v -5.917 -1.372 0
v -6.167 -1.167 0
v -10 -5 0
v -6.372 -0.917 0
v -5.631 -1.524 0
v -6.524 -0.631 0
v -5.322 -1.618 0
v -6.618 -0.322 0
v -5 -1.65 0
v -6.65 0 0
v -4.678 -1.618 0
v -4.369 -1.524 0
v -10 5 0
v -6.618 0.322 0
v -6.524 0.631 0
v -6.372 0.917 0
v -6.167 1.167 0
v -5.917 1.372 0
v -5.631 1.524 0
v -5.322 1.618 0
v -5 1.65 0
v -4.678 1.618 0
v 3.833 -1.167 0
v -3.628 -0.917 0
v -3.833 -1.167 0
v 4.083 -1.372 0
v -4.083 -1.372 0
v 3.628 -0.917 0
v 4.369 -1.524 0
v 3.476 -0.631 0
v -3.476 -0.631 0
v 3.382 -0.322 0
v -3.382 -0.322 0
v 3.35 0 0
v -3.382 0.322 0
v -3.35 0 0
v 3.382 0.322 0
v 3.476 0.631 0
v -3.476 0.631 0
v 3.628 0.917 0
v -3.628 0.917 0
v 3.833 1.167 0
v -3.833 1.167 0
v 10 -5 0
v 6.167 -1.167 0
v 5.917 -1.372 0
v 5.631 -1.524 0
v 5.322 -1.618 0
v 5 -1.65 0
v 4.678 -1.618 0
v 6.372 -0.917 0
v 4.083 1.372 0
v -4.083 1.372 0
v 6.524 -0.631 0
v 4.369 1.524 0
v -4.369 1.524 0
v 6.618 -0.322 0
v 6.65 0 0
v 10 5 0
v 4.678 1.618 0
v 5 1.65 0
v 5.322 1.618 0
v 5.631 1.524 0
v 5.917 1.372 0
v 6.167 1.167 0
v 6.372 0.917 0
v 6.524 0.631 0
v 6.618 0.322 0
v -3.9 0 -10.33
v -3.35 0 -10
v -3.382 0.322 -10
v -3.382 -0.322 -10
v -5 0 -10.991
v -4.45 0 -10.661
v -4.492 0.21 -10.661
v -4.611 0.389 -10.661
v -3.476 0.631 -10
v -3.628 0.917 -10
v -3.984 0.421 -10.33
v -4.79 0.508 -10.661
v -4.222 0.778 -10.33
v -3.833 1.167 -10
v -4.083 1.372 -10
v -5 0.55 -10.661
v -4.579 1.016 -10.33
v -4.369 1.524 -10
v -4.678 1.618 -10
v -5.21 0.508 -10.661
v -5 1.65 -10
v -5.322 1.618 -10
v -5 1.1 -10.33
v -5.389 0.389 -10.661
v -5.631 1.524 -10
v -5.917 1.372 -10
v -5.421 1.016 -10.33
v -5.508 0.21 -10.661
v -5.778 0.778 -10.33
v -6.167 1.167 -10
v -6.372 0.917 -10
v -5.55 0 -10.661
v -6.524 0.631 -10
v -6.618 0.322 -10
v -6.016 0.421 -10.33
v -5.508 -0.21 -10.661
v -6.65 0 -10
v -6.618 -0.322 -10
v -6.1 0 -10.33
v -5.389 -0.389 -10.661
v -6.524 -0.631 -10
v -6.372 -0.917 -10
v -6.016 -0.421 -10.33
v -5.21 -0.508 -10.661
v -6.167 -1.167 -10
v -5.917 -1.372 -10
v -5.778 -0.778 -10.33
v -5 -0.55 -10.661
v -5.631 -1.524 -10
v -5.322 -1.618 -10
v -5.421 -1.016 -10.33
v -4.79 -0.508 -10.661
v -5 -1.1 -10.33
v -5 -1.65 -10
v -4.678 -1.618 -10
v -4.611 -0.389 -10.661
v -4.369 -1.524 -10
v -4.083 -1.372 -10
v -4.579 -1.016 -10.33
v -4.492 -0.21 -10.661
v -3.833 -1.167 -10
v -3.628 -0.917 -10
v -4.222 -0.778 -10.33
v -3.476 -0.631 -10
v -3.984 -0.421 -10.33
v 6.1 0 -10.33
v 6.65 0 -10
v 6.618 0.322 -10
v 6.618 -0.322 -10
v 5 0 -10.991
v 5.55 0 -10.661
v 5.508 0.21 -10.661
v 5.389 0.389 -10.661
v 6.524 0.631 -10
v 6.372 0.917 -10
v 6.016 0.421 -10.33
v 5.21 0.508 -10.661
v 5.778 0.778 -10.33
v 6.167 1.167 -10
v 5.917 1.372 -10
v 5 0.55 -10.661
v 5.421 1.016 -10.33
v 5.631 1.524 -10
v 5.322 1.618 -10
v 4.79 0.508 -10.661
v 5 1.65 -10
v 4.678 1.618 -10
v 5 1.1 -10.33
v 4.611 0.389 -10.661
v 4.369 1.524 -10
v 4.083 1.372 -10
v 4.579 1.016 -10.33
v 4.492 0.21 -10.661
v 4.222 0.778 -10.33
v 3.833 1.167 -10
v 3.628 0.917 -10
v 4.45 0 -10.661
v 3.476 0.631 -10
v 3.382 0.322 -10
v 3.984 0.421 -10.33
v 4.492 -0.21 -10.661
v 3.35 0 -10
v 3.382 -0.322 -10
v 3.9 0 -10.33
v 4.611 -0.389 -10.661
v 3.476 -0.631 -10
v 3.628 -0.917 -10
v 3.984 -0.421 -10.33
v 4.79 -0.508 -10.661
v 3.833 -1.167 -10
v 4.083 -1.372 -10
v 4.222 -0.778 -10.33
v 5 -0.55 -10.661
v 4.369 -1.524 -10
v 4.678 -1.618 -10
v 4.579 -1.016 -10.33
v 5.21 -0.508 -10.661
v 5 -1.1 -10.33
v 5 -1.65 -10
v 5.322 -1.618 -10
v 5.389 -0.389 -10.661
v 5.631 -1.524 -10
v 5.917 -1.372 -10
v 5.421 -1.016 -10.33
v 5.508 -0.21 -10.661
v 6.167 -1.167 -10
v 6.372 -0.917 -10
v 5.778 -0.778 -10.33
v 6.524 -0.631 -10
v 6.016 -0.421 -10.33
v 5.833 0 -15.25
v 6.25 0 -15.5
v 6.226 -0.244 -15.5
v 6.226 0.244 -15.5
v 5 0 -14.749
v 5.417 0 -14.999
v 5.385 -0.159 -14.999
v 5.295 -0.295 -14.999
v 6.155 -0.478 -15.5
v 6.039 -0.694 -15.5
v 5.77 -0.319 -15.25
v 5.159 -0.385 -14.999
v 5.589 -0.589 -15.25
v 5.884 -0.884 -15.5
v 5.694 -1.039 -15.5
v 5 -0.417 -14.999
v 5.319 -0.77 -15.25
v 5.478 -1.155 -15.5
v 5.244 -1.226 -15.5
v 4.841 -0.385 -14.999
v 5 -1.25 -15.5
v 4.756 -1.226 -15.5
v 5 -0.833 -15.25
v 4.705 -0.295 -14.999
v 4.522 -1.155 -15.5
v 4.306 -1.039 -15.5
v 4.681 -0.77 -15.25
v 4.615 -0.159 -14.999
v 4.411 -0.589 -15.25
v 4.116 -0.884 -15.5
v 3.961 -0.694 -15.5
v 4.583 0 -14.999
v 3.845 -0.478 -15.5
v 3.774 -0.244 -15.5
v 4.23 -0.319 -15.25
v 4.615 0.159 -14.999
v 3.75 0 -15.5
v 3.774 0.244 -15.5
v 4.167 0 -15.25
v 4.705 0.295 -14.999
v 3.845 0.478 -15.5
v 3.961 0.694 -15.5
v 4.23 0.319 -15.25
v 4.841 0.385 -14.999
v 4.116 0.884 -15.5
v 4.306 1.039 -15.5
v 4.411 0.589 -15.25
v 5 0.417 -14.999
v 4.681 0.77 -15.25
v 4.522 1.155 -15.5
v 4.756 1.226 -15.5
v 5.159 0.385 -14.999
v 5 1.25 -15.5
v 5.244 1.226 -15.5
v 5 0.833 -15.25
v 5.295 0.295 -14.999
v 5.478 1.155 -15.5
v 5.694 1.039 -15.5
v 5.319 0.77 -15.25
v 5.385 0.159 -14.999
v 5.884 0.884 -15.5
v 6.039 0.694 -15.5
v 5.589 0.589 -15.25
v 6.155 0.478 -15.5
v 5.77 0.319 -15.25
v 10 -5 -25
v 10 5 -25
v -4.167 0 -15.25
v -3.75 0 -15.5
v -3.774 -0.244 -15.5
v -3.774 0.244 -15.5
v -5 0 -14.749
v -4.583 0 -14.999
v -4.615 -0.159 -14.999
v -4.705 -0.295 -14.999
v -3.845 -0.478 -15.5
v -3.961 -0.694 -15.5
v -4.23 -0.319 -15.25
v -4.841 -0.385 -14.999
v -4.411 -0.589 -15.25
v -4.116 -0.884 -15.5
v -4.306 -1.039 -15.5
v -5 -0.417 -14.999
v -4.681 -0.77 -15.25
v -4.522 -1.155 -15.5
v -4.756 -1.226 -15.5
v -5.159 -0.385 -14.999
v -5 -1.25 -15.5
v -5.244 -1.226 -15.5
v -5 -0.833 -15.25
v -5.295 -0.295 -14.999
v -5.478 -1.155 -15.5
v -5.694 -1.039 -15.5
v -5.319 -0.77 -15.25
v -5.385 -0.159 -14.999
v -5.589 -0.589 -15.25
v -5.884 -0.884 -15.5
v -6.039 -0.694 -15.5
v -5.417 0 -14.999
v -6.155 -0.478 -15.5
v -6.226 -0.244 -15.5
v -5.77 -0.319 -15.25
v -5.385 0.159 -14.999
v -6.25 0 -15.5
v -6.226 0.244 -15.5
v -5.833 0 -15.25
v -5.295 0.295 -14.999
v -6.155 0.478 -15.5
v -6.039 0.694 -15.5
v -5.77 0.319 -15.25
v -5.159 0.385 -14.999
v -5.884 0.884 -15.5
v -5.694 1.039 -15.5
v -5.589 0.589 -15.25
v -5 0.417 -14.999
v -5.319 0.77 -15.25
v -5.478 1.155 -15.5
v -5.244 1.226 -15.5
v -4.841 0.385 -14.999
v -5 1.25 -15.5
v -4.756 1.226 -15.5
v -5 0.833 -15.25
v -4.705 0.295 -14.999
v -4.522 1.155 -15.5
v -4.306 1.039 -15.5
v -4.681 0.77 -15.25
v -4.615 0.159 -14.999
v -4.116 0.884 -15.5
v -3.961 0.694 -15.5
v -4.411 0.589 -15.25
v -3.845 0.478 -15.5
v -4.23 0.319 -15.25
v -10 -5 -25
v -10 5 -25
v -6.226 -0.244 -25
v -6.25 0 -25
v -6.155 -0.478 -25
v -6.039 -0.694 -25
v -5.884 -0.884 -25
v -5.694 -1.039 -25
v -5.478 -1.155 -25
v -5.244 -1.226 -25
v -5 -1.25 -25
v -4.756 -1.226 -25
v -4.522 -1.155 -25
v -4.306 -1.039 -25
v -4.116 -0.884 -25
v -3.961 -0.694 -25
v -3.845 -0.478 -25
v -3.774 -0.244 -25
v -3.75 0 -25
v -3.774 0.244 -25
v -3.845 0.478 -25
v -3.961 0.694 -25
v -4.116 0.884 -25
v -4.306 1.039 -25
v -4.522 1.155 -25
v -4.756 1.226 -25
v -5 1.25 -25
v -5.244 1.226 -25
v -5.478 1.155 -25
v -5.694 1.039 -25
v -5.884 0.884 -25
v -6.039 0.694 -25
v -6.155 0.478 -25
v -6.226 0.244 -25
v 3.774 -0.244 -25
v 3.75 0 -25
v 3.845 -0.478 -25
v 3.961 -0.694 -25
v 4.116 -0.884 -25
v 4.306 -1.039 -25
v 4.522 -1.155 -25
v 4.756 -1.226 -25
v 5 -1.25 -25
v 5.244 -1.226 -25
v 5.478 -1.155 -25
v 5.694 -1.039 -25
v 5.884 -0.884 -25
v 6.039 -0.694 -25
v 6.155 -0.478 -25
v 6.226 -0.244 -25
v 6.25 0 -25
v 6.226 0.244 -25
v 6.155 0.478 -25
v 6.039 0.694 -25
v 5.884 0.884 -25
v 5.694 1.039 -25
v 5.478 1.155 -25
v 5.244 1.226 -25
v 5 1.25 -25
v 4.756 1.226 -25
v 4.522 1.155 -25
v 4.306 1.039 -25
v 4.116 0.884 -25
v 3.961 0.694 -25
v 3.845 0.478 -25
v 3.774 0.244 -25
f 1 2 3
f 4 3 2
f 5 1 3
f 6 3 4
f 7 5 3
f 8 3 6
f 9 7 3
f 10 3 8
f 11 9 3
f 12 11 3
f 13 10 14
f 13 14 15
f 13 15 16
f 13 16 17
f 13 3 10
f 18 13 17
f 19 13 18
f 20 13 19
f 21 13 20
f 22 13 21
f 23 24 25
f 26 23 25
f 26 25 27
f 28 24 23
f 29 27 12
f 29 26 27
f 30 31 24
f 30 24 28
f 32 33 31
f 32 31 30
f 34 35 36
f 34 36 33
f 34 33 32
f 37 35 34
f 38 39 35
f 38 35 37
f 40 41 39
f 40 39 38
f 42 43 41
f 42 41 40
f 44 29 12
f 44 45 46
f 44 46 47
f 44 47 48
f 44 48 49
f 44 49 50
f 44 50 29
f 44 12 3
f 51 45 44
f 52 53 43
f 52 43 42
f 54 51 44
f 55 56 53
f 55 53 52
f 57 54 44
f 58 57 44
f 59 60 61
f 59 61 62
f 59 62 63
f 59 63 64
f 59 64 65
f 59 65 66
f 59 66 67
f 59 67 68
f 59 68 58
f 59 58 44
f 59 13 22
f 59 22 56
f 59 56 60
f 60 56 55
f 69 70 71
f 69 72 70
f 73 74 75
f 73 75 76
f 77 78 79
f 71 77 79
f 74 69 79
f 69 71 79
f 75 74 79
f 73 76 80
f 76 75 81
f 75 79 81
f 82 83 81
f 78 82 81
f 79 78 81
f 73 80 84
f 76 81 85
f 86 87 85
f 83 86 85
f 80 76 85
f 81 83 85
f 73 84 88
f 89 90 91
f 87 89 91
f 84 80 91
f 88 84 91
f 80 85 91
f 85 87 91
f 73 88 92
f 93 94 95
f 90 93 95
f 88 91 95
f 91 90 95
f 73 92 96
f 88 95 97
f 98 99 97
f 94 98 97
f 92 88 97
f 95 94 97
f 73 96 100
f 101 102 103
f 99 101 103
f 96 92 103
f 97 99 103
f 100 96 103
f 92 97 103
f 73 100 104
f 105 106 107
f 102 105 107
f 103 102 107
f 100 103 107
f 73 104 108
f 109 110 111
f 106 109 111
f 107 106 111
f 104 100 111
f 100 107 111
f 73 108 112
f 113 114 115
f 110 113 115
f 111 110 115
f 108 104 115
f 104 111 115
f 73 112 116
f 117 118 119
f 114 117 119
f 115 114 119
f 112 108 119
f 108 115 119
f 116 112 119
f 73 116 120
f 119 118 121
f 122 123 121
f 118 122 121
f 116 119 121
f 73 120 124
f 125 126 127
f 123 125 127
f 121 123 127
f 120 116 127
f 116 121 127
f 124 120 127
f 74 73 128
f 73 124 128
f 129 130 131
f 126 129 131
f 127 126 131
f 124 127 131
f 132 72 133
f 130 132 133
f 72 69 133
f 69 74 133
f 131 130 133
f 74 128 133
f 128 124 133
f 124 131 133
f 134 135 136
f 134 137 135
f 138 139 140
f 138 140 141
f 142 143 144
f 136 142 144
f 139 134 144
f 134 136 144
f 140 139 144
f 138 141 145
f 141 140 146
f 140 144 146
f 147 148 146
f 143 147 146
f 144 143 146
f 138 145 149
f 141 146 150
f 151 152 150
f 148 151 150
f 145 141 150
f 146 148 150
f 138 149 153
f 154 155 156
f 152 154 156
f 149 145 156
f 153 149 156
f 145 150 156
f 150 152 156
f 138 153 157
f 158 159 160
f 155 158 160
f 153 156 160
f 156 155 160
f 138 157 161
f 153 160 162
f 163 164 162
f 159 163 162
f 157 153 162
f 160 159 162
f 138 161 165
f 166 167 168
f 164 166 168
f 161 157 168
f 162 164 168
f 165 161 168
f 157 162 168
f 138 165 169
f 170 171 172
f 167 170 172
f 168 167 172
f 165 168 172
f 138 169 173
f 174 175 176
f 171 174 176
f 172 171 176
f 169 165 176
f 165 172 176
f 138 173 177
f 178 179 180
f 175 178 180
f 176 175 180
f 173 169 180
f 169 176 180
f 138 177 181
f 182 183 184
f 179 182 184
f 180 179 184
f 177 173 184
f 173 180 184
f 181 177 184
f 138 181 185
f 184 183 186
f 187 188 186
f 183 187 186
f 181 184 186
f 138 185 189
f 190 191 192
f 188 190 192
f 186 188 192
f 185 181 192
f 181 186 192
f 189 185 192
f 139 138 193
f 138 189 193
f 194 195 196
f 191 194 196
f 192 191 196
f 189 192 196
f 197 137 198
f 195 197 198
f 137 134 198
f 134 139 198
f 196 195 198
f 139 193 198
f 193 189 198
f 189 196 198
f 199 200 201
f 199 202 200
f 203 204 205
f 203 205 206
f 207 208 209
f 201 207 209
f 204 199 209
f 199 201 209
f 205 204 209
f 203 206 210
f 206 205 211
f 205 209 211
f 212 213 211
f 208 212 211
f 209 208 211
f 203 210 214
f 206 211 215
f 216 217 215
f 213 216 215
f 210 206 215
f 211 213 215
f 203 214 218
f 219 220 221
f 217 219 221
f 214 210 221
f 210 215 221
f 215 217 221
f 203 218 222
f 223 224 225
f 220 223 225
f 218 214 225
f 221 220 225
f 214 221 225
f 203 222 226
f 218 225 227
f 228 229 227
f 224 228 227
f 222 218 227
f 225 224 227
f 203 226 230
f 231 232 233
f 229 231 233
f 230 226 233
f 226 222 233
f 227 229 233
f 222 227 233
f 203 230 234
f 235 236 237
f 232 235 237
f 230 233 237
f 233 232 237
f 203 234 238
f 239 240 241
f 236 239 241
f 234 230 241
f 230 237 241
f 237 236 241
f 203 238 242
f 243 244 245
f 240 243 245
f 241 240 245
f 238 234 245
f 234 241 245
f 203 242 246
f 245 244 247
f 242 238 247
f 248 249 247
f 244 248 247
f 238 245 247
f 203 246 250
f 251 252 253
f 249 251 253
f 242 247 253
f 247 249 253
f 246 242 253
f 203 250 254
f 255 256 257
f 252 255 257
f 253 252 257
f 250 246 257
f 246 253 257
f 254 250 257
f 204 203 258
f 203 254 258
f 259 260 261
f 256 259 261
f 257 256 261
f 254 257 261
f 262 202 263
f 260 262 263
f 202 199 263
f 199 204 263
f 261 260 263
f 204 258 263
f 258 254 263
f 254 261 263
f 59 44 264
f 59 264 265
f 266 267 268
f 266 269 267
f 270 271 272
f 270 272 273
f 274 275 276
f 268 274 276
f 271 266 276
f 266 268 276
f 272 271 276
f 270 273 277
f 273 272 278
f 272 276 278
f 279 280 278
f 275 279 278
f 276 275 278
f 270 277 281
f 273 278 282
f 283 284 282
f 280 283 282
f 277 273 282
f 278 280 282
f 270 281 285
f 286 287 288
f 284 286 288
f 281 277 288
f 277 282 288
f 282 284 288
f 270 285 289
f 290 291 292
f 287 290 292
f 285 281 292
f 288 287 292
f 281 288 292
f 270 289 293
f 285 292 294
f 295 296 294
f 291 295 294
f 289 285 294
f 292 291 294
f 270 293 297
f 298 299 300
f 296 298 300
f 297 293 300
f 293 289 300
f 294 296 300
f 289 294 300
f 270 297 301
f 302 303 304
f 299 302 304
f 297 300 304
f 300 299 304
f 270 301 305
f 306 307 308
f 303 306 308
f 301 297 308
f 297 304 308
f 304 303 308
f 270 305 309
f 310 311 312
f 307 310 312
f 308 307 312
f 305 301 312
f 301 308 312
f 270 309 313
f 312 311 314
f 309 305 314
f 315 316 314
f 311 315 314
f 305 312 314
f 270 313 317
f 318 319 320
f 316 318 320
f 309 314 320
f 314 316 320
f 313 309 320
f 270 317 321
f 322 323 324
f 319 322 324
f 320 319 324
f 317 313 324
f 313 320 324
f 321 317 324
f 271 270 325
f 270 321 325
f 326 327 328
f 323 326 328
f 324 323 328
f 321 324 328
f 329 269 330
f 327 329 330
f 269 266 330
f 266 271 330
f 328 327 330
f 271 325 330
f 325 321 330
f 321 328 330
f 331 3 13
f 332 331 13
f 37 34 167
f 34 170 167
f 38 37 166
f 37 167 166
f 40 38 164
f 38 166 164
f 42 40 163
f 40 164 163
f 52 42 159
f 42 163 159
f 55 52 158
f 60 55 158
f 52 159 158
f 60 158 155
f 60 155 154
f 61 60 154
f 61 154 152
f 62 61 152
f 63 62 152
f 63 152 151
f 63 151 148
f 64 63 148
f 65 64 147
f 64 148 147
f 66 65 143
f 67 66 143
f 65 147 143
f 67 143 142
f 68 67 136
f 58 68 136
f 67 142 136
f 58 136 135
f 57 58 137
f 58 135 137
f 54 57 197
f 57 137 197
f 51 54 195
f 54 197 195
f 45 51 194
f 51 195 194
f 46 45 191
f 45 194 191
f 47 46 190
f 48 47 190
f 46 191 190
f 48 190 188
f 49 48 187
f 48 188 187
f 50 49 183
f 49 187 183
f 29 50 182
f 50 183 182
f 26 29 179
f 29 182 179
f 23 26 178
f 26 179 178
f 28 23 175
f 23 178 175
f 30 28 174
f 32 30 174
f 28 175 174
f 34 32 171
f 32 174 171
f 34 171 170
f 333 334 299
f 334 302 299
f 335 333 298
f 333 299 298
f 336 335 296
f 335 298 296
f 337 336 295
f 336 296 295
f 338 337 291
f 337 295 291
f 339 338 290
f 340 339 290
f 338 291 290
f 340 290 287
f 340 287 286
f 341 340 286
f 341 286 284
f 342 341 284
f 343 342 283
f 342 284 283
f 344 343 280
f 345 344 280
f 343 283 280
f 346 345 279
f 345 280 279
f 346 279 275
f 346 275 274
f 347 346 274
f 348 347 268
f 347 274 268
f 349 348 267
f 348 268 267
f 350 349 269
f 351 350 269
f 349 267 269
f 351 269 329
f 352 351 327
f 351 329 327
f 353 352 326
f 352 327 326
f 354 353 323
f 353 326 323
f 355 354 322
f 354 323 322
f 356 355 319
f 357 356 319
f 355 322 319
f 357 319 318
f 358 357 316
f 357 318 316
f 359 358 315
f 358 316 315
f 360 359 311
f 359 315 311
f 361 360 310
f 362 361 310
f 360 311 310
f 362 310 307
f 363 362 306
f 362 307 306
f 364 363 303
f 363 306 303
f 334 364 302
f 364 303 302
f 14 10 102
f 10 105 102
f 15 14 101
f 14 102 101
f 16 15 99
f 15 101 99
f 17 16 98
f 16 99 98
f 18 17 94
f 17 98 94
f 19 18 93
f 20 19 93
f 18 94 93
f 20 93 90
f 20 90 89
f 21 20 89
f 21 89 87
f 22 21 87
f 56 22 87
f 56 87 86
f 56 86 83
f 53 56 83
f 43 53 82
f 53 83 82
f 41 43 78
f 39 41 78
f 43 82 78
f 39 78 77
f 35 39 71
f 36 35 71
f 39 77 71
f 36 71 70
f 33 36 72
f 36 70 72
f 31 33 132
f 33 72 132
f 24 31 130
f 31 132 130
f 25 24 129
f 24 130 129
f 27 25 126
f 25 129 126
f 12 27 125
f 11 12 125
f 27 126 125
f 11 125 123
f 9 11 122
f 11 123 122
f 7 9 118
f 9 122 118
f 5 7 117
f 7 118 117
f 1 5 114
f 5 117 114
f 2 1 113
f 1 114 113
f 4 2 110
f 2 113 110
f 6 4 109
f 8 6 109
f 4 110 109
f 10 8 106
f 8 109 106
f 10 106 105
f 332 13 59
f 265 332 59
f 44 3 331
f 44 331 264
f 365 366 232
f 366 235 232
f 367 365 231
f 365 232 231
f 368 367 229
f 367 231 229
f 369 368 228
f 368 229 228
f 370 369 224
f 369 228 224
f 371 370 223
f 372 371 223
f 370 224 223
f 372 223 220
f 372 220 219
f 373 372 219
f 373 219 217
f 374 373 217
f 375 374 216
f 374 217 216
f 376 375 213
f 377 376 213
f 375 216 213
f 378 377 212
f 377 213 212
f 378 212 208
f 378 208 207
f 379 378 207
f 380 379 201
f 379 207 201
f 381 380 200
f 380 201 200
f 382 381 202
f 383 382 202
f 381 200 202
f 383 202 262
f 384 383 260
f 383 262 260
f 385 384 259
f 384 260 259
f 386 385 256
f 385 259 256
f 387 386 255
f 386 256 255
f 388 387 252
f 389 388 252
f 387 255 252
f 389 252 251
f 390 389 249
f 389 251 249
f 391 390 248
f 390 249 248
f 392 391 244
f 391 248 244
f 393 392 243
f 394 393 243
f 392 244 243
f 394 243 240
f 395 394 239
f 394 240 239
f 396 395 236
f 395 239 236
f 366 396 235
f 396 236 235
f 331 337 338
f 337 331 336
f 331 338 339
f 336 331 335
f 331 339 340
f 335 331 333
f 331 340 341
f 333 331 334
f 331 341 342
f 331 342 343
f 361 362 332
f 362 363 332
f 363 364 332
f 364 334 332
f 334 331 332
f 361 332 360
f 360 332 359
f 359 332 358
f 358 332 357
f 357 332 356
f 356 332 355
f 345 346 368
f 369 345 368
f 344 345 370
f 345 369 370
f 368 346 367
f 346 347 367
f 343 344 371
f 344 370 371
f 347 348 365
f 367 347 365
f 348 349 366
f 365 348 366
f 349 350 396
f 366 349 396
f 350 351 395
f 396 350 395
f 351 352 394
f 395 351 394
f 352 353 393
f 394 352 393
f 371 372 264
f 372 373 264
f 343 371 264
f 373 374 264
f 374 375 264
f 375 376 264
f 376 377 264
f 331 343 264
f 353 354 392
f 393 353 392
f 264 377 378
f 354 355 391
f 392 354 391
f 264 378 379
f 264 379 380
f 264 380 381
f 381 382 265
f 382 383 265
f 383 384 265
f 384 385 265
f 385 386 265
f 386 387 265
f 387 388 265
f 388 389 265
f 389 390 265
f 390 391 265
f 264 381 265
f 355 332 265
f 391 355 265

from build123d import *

# Parameters (mm, degrees)
F0_W     = 20
F0_H     = 10
F1_DEPTH = 25
F3_D     = 2.5
F3_DEPTH = 9.5
F3_TIP   = 0.7510757738
F4_D     = 3.3
F4_DEPTH = 10
F4_TIP   = 0.9914200214


with BuildPart() as f1:
    # F0 (on Top) → F1 (new body)
    with BuildSketch(Plane.XY):
        Rectangle(F0_W, F0_H)
    extrude(amount=-F1_DEPTH)

    # F3
    with Locations(Plane(origin=(0, 0, -25), x_dir=(1, 0, 0), z_dir=(0, 0, -1))):
        with Locations((-5, 0), (5, 0)):
            Hole(F3_D / 2, depth=F3_DEPTH)
            with Locations((0, 0, -(F3_DEPTH + F3_TIP / 2))):  # 118° drill point
                Cone(0, F3_D / 2, F3_TIP, mode=Mode.SUBTRACT)

    # F4
    with Locations(Plane.XY):
        with Locations((-5, 0), (5, 0)):
            Hole(F4_D / 2, depth=F4_DEPTH)
            with Locations((0, 0, -(F4_DEPTH + F4_TIP / 2))):  # 118° drill point
                Cone(0, F4_D / 2, F4_TIP, mode=Mode.SUBTRACT)


solid = f1.part
